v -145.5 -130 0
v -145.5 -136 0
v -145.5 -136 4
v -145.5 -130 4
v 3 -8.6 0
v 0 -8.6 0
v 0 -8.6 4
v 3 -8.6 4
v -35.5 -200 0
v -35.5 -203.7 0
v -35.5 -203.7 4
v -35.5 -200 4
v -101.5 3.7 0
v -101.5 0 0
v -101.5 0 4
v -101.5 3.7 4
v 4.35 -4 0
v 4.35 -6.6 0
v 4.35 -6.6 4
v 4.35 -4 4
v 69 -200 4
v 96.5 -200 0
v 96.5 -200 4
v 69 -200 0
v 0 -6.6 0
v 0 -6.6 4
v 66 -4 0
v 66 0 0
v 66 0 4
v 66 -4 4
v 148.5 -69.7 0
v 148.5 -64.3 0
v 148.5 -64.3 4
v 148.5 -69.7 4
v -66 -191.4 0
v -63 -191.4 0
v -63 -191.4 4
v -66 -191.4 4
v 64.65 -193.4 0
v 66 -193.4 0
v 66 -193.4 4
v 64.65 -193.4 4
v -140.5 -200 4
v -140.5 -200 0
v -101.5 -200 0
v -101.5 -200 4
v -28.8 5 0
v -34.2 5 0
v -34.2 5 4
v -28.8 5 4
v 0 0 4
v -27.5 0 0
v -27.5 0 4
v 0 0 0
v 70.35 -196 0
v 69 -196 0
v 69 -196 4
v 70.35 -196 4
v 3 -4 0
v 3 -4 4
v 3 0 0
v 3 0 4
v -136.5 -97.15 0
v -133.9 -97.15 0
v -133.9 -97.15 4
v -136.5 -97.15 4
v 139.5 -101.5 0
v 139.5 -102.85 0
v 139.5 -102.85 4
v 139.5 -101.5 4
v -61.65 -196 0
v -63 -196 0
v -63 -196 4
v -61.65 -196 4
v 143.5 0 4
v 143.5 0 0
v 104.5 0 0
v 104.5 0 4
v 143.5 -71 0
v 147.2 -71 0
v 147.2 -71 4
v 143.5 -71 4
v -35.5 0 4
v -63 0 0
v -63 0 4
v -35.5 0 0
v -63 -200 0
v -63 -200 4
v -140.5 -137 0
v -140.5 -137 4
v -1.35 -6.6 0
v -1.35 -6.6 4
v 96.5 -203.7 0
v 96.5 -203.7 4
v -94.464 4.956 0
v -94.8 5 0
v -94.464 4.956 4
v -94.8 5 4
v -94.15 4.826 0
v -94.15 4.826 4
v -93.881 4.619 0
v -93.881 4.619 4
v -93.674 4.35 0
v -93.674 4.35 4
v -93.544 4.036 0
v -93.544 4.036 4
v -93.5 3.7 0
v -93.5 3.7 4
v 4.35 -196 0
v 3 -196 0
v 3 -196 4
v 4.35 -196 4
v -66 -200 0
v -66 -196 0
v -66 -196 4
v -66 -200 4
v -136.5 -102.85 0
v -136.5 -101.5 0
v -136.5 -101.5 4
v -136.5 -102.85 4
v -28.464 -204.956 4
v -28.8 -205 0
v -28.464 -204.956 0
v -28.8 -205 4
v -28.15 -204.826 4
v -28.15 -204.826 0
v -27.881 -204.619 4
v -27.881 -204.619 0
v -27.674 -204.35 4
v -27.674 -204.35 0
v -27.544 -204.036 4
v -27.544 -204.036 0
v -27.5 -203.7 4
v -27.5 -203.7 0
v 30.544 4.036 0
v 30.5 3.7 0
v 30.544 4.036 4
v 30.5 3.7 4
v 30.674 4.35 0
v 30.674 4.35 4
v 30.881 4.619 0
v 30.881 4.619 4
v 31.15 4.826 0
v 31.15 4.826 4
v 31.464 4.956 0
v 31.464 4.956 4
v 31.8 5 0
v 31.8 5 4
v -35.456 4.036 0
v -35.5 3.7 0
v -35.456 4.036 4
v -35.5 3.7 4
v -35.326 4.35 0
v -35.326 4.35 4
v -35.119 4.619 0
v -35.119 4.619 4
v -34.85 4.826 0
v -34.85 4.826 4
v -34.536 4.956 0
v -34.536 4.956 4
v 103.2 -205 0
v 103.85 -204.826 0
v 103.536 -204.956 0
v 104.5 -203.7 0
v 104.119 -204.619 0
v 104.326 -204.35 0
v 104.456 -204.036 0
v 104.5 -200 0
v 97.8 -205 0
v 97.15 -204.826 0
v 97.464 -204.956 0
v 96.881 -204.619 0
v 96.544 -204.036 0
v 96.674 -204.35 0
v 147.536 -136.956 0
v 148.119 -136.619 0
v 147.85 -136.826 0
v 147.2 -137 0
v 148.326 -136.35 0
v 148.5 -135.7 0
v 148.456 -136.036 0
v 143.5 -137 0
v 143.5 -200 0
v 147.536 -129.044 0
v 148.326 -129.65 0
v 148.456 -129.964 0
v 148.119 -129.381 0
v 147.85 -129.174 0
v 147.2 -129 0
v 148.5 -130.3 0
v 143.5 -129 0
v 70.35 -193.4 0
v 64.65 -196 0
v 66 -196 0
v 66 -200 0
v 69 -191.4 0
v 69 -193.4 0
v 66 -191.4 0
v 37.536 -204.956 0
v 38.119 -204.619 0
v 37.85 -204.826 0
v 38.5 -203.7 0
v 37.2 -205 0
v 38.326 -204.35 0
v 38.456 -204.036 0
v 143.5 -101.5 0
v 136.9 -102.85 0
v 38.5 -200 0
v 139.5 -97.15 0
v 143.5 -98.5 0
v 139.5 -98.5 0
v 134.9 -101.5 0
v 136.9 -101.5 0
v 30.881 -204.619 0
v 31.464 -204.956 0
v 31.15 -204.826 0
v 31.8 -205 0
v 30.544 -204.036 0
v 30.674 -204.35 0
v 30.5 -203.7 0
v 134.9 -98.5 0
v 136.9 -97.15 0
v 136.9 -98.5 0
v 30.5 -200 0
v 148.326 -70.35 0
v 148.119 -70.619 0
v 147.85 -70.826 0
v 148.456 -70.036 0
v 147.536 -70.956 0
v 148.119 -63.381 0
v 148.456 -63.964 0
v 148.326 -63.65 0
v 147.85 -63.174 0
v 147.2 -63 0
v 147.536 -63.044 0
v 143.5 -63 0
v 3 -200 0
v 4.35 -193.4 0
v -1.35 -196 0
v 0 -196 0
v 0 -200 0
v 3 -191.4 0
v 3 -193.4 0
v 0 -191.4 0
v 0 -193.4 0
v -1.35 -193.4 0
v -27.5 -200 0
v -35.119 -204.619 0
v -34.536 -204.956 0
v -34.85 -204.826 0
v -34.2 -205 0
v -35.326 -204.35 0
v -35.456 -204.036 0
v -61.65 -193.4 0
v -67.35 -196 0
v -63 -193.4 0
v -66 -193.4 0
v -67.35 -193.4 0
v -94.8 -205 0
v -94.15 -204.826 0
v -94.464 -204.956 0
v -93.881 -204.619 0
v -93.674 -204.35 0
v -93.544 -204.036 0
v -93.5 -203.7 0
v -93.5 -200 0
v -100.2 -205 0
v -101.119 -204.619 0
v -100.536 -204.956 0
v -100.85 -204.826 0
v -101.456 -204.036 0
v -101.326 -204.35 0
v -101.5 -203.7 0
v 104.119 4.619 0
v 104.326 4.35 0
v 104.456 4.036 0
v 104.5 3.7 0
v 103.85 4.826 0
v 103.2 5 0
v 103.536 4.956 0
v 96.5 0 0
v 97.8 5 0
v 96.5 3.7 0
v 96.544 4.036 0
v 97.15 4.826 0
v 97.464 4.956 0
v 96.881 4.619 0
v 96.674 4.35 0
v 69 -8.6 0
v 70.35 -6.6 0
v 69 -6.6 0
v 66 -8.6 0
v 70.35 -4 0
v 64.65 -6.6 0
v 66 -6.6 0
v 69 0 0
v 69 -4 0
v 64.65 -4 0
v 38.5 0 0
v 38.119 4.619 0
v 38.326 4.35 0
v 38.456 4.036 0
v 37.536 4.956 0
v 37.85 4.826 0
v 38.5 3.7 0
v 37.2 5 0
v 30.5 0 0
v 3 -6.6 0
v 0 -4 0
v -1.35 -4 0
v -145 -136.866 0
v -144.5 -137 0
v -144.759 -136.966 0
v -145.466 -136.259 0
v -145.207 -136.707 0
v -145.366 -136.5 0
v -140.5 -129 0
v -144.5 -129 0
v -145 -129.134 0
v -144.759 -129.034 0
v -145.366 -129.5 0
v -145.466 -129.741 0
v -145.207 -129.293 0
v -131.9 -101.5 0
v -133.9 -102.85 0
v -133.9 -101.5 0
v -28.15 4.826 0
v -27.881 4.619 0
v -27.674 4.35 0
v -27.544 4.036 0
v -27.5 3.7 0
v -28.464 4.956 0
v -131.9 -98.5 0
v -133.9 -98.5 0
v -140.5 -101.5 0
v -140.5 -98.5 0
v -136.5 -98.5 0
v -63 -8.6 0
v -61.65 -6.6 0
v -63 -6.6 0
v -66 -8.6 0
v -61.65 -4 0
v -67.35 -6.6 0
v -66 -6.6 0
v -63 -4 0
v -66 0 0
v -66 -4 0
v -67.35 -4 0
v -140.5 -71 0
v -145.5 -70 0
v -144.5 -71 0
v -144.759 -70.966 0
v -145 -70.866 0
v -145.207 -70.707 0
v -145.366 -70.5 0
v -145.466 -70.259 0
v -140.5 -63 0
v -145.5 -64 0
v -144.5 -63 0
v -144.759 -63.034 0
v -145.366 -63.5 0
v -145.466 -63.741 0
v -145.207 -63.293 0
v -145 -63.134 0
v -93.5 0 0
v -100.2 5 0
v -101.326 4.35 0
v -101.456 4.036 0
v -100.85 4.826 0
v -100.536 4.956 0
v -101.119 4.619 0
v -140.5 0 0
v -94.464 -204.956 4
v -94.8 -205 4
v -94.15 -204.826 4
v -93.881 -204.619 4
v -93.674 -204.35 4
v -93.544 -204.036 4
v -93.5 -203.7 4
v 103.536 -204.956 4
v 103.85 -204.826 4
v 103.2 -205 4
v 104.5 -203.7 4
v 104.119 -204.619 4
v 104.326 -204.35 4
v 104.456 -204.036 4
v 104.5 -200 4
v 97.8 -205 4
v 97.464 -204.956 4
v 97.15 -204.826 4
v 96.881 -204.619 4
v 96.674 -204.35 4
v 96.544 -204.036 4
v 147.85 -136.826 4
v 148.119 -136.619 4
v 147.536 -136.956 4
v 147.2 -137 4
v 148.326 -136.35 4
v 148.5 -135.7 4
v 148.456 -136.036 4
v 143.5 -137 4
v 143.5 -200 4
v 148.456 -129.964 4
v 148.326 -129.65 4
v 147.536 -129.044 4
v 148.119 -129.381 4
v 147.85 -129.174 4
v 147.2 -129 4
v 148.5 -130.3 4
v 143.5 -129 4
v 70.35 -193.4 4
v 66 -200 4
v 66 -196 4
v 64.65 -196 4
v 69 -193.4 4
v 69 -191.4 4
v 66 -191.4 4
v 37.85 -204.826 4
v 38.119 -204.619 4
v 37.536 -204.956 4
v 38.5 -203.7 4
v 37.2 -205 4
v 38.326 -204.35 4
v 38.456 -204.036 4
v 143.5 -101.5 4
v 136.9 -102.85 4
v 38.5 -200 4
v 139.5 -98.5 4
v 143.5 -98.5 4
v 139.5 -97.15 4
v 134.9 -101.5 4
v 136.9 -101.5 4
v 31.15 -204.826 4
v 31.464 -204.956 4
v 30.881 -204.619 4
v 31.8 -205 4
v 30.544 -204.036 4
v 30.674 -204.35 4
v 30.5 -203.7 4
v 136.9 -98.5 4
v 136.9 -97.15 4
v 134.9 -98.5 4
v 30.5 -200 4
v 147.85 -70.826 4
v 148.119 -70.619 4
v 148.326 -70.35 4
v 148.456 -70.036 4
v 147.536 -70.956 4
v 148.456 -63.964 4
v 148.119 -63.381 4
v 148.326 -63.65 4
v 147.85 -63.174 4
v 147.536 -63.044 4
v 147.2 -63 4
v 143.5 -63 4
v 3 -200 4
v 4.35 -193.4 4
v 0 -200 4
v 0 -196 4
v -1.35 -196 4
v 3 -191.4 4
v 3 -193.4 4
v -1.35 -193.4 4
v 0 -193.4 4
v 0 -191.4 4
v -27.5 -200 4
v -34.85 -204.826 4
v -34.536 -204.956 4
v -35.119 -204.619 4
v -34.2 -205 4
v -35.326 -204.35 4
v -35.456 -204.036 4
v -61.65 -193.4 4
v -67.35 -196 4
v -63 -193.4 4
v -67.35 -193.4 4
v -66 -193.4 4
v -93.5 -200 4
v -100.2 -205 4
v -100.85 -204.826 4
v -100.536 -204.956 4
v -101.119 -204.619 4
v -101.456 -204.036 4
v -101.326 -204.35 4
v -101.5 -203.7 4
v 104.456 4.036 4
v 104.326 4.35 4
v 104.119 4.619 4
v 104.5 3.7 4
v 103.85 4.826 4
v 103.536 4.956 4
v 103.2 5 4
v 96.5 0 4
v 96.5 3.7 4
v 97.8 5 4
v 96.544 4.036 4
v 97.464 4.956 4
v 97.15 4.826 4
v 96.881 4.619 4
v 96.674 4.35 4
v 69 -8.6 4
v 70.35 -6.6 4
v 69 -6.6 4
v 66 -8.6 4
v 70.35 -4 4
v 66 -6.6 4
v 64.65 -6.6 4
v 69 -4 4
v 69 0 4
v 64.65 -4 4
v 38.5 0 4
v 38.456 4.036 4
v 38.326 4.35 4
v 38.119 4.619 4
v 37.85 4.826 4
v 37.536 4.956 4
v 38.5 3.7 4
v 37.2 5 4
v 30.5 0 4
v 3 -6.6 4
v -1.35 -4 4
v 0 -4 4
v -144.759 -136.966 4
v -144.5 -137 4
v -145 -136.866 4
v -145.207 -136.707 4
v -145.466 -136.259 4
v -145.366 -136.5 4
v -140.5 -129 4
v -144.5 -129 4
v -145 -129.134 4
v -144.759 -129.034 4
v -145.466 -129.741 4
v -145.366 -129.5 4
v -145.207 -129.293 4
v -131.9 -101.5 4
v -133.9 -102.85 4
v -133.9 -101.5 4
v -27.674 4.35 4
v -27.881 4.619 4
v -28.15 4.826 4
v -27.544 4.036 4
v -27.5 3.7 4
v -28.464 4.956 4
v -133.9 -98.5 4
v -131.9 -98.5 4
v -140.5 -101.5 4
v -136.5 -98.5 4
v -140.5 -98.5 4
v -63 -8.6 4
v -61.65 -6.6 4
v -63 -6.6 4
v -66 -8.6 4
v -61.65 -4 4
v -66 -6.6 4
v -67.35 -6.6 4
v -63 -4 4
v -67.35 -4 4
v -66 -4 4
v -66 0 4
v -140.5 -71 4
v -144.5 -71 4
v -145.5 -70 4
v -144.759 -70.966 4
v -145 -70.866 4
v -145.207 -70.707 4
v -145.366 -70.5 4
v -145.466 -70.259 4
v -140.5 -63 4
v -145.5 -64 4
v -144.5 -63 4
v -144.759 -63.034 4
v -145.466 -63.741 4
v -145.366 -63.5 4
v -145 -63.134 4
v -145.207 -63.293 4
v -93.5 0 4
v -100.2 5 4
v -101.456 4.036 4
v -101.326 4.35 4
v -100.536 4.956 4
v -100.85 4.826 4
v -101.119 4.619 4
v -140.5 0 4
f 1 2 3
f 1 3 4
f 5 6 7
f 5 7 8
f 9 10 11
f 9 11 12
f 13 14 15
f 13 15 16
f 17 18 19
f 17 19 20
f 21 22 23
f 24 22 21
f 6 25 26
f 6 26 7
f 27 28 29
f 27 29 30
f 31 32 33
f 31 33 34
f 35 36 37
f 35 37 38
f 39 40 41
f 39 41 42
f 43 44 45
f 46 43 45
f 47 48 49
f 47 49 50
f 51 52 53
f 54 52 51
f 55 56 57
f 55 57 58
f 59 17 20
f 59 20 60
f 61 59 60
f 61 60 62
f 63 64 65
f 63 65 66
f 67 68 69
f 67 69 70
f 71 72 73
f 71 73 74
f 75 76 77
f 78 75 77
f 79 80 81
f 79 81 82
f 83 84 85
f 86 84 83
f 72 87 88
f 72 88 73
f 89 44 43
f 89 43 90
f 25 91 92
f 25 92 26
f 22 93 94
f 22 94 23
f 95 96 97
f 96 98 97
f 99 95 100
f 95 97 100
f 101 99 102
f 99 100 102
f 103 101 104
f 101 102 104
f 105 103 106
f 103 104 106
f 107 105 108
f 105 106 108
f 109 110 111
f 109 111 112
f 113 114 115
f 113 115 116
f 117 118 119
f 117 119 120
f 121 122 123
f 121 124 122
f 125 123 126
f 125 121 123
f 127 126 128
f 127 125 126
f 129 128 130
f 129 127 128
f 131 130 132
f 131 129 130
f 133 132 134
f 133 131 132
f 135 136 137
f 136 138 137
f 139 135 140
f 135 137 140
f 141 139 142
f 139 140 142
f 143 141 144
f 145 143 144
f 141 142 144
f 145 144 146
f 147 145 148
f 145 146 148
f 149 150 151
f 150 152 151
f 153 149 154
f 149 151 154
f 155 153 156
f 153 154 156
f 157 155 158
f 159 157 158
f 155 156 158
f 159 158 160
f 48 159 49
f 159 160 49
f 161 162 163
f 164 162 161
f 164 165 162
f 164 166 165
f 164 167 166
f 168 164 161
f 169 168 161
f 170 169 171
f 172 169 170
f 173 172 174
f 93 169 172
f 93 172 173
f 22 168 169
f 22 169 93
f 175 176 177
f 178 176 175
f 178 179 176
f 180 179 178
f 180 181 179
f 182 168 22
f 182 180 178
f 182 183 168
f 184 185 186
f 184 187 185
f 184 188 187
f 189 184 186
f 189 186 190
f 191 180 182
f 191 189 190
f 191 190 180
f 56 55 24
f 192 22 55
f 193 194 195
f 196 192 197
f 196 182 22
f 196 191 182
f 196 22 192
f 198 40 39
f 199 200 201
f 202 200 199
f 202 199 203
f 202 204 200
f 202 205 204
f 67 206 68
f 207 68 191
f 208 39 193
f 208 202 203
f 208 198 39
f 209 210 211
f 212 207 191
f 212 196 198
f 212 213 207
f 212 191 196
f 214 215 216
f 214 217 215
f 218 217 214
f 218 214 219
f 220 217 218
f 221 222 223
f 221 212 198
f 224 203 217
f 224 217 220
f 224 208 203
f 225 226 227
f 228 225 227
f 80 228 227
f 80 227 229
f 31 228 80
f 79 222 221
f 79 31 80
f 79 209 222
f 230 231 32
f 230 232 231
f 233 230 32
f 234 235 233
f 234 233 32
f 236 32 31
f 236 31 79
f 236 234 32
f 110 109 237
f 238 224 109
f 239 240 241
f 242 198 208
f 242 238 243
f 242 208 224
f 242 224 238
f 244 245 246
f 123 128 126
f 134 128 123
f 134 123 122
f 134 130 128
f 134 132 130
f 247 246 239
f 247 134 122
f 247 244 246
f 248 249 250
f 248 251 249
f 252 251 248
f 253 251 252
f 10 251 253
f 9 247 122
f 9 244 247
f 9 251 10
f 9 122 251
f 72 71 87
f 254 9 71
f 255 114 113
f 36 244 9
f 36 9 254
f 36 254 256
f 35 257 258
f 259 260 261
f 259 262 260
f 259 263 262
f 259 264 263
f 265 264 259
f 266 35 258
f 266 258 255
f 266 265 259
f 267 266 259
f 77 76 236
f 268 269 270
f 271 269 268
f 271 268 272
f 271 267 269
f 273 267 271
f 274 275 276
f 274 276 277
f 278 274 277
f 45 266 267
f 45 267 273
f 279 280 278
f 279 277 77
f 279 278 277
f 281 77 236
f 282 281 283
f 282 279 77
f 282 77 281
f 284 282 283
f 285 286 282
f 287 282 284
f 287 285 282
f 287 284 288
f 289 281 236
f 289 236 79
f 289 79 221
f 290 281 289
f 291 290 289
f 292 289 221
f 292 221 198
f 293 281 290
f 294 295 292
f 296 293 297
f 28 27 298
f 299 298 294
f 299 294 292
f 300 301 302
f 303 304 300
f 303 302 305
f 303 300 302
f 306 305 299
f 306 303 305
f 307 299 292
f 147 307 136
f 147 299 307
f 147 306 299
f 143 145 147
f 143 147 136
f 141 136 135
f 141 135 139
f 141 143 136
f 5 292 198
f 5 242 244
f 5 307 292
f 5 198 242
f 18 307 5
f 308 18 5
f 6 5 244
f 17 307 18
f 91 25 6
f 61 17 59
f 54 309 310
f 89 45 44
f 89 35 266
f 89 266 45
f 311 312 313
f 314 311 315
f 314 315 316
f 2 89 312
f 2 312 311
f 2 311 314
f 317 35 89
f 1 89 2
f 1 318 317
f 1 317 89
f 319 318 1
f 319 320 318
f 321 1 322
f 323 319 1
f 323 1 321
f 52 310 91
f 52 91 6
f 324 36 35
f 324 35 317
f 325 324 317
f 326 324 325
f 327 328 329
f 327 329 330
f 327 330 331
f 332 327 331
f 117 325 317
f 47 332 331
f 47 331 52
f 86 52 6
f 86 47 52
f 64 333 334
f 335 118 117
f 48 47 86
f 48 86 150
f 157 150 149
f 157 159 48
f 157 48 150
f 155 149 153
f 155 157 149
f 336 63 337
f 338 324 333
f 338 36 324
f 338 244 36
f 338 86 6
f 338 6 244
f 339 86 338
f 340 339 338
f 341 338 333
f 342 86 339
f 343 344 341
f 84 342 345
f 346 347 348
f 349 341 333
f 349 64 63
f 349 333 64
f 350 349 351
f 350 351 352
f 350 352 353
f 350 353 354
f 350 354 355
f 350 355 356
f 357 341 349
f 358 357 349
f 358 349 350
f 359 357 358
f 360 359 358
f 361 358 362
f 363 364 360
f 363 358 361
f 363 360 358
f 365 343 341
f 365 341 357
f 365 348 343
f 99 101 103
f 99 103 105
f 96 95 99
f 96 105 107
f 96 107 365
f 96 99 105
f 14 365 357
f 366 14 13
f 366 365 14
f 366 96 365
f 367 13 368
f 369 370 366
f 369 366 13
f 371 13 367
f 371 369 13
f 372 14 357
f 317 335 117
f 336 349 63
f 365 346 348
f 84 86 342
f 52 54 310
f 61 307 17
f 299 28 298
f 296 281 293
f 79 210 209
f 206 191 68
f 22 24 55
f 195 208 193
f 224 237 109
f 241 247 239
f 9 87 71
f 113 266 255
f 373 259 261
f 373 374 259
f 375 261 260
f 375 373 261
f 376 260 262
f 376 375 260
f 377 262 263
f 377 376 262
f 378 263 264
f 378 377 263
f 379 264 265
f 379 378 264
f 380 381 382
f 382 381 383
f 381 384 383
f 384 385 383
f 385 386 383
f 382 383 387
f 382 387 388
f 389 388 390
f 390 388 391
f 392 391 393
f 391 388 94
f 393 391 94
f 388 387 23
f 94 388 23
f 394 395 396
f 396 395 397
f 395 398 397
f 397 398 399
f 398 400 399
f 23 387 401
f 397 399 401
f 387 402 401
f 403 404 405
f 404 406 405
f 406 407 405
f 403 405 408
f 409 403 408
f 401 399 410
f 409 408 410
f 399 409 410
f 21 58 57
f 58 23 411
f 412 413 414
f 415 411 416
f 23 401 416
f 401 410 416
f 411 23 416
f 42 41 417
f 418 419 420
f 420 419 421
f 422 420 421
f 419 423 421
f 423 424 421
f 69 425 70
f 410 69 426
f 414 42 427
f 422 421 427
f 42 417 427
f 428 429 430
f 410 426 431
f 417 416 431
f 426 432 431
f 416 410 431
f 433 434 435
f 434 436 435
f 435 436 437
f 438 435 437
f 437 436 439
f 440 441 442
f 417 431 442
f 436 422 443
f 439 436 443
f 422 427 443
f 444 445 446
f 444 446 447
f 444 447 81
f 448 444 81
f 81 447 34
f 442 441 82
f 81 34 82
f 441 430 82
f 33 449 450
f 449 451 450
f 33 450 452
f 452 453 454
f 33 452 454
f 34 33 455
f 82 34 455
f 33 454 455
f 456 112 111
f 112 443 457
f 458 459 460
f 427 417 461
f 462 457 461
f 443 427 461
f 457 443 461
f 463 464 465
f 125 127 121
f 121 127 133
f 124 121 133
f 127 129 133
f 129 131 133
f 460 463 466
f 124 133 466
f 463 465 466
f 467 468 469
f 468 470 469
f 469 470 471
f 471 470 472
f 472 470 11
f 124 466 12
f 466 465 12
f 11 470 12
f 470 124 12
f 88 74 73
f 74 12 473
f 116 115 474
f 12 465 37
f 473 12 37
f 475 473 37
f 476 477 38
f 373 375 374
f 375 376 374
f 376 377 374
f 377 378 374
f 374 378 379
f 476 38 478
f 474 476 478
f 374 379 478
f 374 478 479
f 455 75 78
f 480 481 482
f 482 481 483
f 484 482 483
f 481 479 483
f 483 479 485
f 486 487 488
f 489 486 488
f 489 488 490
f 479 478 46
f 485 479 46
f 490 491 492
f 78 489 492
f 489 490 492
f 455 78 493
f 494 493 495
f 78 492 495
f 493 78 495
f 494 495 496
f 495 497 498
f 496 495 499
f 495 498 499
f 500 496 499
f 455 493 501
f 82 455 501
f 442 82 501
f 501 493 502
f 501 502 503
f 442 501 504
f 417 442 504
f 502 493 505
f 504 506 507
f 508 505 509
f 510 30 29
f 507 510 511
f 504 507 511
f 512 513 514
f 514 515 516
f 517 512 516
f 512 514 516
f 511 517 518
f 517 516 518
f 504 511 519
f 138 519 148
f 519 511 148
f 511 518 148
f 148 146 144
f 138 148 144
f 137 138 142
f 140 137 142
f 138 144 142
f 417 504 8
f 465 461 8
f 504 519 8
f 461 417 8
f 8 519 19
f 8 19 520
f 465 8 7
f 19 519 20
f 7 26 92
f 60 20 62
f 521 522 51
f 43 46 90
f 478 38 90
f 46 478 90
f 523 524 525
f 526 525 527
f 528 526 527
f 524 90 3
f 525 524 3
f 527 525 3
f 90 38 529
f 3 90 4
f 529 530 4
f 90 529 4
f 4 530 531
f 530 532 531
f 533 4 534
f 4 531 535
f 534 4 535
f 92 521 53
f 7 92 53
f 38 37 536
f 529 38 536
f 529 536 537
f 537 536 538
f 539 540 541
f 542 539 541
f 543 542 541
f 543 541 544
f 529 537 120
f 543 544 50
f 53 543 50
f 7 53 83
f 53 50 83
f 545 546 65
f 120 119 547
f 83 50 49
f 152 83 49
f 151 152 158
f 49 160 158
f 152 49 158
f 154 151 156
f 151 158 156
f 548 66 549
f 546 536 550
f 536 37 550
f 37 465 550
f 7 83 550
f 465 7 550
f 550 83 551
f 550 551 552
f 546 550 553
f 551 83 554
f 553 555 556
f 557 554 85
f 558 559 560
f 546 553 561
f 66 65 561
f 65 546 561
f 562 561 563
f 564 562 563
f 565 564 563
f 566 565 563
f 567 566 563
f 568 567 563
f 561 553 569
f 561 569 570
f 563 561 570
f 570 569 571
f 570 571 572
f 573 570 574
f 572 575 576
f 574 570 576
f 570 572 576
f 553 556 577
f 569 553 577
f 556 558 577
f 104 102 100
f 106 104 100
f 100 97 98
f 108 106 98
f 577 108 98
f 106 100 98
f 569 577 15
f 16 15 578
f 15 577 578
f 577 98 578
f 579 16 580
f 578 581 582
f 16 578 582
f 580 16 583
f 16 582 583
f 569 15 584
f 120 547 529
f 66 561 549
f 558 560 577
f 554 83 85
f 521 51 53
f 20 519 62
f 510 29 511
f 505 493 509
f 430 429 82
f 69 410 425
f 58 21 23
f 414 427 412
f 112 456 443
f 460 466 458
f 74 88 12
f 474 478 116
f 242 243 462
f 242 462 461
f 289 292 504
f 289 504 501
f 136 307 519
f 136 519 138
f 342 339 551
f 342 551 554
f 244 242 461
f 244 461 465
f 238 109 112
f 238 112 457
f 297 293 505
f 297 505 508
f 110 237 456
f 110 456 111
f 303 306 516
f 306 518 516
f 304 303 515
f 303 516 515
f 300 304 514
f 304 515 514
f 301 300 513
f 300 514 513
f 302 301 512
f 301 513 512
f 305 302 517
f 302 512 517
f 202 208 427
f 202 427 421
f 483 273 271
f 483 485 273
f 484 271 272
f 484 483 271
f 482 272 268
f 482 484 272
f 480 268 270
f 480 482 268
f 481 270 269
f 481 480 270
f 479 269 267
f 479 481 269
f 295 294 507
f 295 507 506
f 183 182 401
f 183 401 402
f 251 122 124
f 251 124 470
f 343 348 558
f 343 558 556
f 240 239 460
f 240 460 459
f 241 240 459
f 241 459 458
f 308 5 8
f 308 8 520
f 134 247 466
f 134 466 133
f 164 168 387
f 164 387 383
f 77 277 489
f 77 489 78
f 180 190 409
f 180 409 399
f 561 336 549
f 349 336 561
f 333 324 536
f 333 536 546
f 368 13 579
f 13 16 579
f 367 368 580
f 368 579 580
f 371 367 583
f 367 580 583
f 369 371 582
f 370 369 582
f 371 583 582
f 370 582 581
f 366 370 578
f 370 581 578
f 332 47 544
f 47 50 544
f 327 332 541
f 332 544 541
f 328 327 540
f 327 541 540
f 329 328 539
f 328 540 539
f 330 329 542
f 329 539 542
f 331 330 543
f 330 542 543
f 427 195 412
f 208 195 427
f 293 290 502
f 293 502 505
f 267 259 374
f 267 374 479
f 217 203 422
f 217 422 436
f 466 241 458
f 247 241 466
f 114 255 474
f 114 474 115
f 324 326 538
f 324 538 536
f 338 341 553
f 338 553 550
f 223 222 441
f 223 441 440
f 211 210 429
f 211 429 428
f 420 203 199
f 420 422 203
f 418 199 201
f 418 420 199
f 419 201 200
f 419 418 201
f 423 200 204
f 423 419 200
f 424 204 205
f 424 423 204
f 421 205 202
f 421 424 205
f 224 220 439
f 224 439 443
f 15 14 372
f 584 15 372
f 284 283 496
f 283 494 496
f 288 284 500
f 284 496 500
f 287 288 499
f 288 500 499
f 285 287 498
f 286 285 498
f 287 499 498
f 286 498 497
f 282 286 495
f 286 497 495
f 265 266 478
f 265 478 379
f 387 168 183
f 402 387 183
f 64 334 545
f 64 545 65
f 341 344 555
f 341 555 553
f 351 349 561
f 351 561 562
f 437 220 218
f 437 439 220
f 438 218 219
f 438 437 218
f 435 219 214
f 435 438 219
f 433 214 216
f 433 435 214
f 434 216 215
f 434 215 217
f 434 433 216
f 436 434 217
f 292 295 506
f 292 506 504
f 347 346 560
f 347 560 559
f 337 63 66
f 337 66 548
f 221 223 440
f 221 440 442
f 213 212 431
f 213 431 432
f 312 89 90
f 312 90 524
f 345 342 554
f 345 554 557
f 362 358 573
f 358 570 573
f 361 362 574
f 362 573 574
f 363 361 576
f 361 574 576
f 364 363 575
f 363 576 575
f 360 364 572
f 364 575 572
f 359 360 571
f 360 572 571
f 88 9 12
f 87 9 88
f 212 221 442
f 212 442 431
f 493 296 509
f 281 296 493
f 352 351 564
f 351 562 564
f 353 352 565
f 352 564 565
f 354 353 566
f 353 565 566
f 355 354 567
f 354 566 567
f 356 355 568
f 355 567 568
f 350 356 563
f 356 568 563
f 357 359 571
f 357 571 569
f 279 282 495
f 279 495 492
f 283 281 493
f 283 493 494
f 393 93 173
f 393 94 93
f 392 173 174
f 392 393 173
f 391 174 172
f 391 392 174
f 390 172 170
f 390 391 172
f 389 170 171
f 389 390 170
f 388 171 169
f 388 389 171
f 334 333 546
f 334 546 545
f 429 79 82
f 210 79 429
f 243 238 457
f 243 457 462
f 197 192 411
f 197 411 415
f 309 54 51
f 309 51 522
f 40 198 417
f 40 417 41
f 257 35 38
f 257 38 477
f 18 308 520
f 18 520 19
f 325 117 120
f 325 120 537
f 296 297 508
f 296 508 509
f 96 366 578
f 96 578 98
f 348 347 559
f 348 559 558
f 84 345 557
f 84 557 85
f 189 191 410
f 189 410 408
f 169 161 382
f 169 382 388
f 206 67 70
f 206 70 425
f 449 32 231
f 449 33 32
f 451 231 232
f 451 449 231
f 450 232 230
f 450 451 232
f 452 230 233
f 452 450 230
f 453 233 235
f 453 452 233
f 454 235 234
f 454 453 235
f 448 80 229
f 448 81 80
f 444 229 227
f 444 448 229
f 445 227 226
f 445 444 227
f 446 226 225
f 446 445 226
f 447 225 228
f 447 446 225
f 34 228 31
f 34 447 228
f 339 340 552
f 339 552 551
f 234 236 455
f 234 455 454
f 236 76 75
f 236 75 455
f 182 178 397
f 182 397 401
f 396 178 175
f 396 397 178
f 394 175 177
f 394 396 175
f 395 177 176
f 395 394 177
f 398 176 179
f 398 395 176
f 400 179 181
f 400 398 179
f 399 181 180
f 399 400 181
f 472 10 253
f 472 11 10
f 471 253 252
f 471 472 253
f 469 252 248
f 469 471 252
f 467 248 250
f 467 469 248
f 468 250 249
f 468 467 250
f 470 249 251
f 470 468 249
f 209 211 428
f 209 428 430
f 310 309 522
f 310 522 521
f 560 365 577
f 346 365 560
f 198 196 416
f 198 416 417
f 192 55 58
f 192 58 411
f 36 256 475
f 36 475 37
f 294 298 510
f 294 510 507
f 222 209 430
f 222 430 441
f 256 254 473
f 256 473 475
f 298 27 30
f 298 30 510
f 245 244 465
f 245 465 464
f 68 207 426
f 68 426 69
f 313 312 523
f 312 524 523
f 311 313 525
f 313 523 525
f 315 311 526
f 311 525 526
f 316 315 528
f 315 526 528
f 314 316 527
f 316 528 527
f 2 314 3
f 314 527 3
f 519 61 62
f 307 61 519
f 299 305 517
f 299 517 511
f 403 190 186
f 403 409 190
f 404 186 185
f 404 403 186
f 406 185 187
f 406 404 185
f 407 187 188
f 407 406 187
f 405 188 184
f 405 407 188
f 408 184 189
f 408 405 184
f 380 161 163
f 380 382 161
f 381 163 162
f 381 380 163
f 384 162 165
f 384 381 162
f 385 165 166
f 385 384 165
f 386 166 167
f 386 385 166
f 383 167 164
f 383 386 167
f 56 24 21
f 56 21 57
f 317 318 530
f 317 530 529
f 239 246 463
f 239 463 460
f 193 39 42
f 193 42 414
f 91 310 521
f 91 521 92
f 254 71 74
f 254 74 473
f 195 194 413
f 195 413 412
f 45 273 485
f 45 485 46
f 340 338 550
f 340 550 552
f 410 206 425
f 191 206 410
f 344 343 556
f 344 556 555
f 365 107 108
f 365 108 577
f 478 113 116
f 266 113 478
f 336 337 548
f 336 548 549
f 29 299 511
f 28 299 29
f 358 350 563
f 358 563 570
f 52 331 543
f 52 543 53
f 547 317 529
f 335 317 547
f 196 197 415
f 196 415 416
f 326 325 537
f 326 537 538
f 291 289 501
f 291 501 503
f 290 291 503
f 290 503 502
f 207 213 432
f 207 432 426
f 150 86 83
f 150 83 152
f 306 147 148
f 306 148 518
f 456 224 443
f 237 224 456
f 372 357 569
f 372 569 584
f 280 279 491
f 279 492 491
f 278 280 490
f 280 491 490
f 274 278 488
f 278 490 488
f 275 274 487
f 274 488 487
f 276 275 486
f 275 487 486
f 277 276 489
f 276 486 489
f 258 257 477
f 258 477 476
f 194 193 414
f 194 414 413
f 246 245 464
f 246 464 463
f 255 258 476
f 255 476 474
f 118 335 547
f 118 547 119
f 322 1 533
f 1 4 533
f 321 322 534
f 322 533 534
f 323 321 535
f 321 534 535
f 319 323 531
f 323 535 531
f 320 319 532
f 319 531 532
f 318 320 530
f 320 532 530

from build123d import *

# Parameters (mm, degrees)
EXTRUDE_1_DEPTH = 4
FILLET_1_R      = 1
FILLET_2_R      = 1.3


with BuildPart() as part:
    # 草图1 → 凸台-拉伸1 (new body)
    with BuildSketch(Plane.XY):
        Polygon((0, 0), (0, -4), (-1.35, -4), (-1.35, -6.6), (0, -6.6), (0, -8.6), (3, -8.6), (3, -6.6), (4.35, -6.6), (4.35, -4), (3, -4), (3, 0), (30.5, 0), (30.5, 5), (38.5, 5), (38.5, 0), (66, 0), (66, -4), (64.65, -4), (64.65, -6.6), (66, -6.6), (66, -8.6), (69, -8.6), (69, -6.6), (70.35, -6.6), (70.35, -4), (69, -4), (69, 0), (96.5, 0), (96.5, 5), (104.5, 5), (104.5, 0), (132, 0), (143.5, 0), (143.5, -63), (148.5, -63), (148.5, -71), (143.5, -71), (143.5, -98.5), (139.5, -98.5), (139.5, -97.15), (136.9, -97.15), (136.9, -98.5), (134.9, -98.5), (134.9, -101.5), (136.9, -101.5), (136.9, -102.85), (139.5, -102.85), (139.5, -101.5), (143.5, -101.5), (143.5, -129), (148.5, -129), (148.5, -137), (143.5, -137), (143.5, -200), (132, -200), (104.5, -200), (104.5, -205), (96.5, -205), (96.5, -200), (69, -200), (69, -196), (70.35, -196), (70.35, -193.4), (69, -193.4), (69, -191.4), (66, -191.4), (66, -193.4), (64.65, -193.4), (64.65, -196), (66, -196), (66, -200), (38.5, -200), (38.5, -205), (30.5, -205), (30.5, -200), (3, -200), (3, -196), (4.35, -196), (4.35, -193.4), (3, -193.4), (3, -191.4), (0, -191.4), (0, -193.4), (-1.35, -193.4), (-1.35, -196), (0, -196), (0, -200), (-27.5, -200), (-27.5, -205), (-35.5, -205), (-35.5, -200), (-63, -200), (-63, -196), (-61.65, -196), (-61.65, -193.4), (-63, -193.4), (-63, -191.4), (-66, -191.4), (-66, -193.4), (-67.35, -193.4), (-67.35, -196), (-66, -196), (-66, -200), (-93.5, -200), (-93.5, -205), (-101.5, -205), (-101.5, -200), (-129, -200), (-140.5, -200), (-140.5, -137), (-145.5, -137), (-145.5, -129), (-140.5, -129), (-140.5, -101.5), (-136.5, -101.5), (-136.5, -102.85), (-133.9, -102.85), (-133.9, -101.5), (-131.9, -101.5), (-131.9, -98.5), (-133.9, -98.5), (-133.9, -97.15), (-136.5, -97.15), (-136.5, -98.5), (-140.5, -98.5), (-140.5, -71), (-145.5, -71), (-145.5, -63), (-140.5, -63), (-140.5, 0), (-129, 0), (-101.5, 0), (-101.5, 5), (-93.5, 5), (-93.5, 0), (-66, 0), (-66, -4), (-67.35, -4), (-67.35, -6.6), (-66, -6.6), (-66, -8.6), (-63, -8.6), (-63, -6.6), (-61.65, -6.6), (-61.65, -4), (-63, -4), (-63, 0), (-35.5, 0), (-35.5, 5), (-27.5, 5), (-27.5, 0), align=None)
    extrude(amount=EXTRUDE_1_DEPTH)

    # 圆角1
    fillet_1_edges = [part.edges().sort_by_distance(p)[0] for p in [
        (-145.5, -63, 2),
        (-145.5, -71, 2),
        (-145.5, -129, 2),
        (-145.5, -137, 2),
    ]]
    fillet(fillet_1_edges, radius=FILLET_1_R)

    # 圆角2
    fillet_2_edges = [part.edges().sort_by_distance(p)[0] for p in [
        (38.5, 5, 2),
        (30.5, 5, 2),
        (-27.5, 5, 2),
        (-35.5, 5, 2),
        (-93.5, 5, 2),
        (-101.5, 5, 2),
        (-101.5, -205, 2),
        (-93.5, -205, 2),
        (-35.5, -205, 2),
        (-27.5, -205, 2),
        (30.5, -205, 2),
        (38.5, -205, 2),
        (96.5, -205, 2),
        (104.5, -205, 2),
        (148.5, -137, 2),
        (148.5, -129, 2),
        (148.5, -71, 2),
        (148.5, -63, 2),
        (104.5, 5, 2),
        (96.5, 5, 2),
    ]]
    fillet(fillet_2_edges, radius=FILLET_2_R)


solid = part.part
